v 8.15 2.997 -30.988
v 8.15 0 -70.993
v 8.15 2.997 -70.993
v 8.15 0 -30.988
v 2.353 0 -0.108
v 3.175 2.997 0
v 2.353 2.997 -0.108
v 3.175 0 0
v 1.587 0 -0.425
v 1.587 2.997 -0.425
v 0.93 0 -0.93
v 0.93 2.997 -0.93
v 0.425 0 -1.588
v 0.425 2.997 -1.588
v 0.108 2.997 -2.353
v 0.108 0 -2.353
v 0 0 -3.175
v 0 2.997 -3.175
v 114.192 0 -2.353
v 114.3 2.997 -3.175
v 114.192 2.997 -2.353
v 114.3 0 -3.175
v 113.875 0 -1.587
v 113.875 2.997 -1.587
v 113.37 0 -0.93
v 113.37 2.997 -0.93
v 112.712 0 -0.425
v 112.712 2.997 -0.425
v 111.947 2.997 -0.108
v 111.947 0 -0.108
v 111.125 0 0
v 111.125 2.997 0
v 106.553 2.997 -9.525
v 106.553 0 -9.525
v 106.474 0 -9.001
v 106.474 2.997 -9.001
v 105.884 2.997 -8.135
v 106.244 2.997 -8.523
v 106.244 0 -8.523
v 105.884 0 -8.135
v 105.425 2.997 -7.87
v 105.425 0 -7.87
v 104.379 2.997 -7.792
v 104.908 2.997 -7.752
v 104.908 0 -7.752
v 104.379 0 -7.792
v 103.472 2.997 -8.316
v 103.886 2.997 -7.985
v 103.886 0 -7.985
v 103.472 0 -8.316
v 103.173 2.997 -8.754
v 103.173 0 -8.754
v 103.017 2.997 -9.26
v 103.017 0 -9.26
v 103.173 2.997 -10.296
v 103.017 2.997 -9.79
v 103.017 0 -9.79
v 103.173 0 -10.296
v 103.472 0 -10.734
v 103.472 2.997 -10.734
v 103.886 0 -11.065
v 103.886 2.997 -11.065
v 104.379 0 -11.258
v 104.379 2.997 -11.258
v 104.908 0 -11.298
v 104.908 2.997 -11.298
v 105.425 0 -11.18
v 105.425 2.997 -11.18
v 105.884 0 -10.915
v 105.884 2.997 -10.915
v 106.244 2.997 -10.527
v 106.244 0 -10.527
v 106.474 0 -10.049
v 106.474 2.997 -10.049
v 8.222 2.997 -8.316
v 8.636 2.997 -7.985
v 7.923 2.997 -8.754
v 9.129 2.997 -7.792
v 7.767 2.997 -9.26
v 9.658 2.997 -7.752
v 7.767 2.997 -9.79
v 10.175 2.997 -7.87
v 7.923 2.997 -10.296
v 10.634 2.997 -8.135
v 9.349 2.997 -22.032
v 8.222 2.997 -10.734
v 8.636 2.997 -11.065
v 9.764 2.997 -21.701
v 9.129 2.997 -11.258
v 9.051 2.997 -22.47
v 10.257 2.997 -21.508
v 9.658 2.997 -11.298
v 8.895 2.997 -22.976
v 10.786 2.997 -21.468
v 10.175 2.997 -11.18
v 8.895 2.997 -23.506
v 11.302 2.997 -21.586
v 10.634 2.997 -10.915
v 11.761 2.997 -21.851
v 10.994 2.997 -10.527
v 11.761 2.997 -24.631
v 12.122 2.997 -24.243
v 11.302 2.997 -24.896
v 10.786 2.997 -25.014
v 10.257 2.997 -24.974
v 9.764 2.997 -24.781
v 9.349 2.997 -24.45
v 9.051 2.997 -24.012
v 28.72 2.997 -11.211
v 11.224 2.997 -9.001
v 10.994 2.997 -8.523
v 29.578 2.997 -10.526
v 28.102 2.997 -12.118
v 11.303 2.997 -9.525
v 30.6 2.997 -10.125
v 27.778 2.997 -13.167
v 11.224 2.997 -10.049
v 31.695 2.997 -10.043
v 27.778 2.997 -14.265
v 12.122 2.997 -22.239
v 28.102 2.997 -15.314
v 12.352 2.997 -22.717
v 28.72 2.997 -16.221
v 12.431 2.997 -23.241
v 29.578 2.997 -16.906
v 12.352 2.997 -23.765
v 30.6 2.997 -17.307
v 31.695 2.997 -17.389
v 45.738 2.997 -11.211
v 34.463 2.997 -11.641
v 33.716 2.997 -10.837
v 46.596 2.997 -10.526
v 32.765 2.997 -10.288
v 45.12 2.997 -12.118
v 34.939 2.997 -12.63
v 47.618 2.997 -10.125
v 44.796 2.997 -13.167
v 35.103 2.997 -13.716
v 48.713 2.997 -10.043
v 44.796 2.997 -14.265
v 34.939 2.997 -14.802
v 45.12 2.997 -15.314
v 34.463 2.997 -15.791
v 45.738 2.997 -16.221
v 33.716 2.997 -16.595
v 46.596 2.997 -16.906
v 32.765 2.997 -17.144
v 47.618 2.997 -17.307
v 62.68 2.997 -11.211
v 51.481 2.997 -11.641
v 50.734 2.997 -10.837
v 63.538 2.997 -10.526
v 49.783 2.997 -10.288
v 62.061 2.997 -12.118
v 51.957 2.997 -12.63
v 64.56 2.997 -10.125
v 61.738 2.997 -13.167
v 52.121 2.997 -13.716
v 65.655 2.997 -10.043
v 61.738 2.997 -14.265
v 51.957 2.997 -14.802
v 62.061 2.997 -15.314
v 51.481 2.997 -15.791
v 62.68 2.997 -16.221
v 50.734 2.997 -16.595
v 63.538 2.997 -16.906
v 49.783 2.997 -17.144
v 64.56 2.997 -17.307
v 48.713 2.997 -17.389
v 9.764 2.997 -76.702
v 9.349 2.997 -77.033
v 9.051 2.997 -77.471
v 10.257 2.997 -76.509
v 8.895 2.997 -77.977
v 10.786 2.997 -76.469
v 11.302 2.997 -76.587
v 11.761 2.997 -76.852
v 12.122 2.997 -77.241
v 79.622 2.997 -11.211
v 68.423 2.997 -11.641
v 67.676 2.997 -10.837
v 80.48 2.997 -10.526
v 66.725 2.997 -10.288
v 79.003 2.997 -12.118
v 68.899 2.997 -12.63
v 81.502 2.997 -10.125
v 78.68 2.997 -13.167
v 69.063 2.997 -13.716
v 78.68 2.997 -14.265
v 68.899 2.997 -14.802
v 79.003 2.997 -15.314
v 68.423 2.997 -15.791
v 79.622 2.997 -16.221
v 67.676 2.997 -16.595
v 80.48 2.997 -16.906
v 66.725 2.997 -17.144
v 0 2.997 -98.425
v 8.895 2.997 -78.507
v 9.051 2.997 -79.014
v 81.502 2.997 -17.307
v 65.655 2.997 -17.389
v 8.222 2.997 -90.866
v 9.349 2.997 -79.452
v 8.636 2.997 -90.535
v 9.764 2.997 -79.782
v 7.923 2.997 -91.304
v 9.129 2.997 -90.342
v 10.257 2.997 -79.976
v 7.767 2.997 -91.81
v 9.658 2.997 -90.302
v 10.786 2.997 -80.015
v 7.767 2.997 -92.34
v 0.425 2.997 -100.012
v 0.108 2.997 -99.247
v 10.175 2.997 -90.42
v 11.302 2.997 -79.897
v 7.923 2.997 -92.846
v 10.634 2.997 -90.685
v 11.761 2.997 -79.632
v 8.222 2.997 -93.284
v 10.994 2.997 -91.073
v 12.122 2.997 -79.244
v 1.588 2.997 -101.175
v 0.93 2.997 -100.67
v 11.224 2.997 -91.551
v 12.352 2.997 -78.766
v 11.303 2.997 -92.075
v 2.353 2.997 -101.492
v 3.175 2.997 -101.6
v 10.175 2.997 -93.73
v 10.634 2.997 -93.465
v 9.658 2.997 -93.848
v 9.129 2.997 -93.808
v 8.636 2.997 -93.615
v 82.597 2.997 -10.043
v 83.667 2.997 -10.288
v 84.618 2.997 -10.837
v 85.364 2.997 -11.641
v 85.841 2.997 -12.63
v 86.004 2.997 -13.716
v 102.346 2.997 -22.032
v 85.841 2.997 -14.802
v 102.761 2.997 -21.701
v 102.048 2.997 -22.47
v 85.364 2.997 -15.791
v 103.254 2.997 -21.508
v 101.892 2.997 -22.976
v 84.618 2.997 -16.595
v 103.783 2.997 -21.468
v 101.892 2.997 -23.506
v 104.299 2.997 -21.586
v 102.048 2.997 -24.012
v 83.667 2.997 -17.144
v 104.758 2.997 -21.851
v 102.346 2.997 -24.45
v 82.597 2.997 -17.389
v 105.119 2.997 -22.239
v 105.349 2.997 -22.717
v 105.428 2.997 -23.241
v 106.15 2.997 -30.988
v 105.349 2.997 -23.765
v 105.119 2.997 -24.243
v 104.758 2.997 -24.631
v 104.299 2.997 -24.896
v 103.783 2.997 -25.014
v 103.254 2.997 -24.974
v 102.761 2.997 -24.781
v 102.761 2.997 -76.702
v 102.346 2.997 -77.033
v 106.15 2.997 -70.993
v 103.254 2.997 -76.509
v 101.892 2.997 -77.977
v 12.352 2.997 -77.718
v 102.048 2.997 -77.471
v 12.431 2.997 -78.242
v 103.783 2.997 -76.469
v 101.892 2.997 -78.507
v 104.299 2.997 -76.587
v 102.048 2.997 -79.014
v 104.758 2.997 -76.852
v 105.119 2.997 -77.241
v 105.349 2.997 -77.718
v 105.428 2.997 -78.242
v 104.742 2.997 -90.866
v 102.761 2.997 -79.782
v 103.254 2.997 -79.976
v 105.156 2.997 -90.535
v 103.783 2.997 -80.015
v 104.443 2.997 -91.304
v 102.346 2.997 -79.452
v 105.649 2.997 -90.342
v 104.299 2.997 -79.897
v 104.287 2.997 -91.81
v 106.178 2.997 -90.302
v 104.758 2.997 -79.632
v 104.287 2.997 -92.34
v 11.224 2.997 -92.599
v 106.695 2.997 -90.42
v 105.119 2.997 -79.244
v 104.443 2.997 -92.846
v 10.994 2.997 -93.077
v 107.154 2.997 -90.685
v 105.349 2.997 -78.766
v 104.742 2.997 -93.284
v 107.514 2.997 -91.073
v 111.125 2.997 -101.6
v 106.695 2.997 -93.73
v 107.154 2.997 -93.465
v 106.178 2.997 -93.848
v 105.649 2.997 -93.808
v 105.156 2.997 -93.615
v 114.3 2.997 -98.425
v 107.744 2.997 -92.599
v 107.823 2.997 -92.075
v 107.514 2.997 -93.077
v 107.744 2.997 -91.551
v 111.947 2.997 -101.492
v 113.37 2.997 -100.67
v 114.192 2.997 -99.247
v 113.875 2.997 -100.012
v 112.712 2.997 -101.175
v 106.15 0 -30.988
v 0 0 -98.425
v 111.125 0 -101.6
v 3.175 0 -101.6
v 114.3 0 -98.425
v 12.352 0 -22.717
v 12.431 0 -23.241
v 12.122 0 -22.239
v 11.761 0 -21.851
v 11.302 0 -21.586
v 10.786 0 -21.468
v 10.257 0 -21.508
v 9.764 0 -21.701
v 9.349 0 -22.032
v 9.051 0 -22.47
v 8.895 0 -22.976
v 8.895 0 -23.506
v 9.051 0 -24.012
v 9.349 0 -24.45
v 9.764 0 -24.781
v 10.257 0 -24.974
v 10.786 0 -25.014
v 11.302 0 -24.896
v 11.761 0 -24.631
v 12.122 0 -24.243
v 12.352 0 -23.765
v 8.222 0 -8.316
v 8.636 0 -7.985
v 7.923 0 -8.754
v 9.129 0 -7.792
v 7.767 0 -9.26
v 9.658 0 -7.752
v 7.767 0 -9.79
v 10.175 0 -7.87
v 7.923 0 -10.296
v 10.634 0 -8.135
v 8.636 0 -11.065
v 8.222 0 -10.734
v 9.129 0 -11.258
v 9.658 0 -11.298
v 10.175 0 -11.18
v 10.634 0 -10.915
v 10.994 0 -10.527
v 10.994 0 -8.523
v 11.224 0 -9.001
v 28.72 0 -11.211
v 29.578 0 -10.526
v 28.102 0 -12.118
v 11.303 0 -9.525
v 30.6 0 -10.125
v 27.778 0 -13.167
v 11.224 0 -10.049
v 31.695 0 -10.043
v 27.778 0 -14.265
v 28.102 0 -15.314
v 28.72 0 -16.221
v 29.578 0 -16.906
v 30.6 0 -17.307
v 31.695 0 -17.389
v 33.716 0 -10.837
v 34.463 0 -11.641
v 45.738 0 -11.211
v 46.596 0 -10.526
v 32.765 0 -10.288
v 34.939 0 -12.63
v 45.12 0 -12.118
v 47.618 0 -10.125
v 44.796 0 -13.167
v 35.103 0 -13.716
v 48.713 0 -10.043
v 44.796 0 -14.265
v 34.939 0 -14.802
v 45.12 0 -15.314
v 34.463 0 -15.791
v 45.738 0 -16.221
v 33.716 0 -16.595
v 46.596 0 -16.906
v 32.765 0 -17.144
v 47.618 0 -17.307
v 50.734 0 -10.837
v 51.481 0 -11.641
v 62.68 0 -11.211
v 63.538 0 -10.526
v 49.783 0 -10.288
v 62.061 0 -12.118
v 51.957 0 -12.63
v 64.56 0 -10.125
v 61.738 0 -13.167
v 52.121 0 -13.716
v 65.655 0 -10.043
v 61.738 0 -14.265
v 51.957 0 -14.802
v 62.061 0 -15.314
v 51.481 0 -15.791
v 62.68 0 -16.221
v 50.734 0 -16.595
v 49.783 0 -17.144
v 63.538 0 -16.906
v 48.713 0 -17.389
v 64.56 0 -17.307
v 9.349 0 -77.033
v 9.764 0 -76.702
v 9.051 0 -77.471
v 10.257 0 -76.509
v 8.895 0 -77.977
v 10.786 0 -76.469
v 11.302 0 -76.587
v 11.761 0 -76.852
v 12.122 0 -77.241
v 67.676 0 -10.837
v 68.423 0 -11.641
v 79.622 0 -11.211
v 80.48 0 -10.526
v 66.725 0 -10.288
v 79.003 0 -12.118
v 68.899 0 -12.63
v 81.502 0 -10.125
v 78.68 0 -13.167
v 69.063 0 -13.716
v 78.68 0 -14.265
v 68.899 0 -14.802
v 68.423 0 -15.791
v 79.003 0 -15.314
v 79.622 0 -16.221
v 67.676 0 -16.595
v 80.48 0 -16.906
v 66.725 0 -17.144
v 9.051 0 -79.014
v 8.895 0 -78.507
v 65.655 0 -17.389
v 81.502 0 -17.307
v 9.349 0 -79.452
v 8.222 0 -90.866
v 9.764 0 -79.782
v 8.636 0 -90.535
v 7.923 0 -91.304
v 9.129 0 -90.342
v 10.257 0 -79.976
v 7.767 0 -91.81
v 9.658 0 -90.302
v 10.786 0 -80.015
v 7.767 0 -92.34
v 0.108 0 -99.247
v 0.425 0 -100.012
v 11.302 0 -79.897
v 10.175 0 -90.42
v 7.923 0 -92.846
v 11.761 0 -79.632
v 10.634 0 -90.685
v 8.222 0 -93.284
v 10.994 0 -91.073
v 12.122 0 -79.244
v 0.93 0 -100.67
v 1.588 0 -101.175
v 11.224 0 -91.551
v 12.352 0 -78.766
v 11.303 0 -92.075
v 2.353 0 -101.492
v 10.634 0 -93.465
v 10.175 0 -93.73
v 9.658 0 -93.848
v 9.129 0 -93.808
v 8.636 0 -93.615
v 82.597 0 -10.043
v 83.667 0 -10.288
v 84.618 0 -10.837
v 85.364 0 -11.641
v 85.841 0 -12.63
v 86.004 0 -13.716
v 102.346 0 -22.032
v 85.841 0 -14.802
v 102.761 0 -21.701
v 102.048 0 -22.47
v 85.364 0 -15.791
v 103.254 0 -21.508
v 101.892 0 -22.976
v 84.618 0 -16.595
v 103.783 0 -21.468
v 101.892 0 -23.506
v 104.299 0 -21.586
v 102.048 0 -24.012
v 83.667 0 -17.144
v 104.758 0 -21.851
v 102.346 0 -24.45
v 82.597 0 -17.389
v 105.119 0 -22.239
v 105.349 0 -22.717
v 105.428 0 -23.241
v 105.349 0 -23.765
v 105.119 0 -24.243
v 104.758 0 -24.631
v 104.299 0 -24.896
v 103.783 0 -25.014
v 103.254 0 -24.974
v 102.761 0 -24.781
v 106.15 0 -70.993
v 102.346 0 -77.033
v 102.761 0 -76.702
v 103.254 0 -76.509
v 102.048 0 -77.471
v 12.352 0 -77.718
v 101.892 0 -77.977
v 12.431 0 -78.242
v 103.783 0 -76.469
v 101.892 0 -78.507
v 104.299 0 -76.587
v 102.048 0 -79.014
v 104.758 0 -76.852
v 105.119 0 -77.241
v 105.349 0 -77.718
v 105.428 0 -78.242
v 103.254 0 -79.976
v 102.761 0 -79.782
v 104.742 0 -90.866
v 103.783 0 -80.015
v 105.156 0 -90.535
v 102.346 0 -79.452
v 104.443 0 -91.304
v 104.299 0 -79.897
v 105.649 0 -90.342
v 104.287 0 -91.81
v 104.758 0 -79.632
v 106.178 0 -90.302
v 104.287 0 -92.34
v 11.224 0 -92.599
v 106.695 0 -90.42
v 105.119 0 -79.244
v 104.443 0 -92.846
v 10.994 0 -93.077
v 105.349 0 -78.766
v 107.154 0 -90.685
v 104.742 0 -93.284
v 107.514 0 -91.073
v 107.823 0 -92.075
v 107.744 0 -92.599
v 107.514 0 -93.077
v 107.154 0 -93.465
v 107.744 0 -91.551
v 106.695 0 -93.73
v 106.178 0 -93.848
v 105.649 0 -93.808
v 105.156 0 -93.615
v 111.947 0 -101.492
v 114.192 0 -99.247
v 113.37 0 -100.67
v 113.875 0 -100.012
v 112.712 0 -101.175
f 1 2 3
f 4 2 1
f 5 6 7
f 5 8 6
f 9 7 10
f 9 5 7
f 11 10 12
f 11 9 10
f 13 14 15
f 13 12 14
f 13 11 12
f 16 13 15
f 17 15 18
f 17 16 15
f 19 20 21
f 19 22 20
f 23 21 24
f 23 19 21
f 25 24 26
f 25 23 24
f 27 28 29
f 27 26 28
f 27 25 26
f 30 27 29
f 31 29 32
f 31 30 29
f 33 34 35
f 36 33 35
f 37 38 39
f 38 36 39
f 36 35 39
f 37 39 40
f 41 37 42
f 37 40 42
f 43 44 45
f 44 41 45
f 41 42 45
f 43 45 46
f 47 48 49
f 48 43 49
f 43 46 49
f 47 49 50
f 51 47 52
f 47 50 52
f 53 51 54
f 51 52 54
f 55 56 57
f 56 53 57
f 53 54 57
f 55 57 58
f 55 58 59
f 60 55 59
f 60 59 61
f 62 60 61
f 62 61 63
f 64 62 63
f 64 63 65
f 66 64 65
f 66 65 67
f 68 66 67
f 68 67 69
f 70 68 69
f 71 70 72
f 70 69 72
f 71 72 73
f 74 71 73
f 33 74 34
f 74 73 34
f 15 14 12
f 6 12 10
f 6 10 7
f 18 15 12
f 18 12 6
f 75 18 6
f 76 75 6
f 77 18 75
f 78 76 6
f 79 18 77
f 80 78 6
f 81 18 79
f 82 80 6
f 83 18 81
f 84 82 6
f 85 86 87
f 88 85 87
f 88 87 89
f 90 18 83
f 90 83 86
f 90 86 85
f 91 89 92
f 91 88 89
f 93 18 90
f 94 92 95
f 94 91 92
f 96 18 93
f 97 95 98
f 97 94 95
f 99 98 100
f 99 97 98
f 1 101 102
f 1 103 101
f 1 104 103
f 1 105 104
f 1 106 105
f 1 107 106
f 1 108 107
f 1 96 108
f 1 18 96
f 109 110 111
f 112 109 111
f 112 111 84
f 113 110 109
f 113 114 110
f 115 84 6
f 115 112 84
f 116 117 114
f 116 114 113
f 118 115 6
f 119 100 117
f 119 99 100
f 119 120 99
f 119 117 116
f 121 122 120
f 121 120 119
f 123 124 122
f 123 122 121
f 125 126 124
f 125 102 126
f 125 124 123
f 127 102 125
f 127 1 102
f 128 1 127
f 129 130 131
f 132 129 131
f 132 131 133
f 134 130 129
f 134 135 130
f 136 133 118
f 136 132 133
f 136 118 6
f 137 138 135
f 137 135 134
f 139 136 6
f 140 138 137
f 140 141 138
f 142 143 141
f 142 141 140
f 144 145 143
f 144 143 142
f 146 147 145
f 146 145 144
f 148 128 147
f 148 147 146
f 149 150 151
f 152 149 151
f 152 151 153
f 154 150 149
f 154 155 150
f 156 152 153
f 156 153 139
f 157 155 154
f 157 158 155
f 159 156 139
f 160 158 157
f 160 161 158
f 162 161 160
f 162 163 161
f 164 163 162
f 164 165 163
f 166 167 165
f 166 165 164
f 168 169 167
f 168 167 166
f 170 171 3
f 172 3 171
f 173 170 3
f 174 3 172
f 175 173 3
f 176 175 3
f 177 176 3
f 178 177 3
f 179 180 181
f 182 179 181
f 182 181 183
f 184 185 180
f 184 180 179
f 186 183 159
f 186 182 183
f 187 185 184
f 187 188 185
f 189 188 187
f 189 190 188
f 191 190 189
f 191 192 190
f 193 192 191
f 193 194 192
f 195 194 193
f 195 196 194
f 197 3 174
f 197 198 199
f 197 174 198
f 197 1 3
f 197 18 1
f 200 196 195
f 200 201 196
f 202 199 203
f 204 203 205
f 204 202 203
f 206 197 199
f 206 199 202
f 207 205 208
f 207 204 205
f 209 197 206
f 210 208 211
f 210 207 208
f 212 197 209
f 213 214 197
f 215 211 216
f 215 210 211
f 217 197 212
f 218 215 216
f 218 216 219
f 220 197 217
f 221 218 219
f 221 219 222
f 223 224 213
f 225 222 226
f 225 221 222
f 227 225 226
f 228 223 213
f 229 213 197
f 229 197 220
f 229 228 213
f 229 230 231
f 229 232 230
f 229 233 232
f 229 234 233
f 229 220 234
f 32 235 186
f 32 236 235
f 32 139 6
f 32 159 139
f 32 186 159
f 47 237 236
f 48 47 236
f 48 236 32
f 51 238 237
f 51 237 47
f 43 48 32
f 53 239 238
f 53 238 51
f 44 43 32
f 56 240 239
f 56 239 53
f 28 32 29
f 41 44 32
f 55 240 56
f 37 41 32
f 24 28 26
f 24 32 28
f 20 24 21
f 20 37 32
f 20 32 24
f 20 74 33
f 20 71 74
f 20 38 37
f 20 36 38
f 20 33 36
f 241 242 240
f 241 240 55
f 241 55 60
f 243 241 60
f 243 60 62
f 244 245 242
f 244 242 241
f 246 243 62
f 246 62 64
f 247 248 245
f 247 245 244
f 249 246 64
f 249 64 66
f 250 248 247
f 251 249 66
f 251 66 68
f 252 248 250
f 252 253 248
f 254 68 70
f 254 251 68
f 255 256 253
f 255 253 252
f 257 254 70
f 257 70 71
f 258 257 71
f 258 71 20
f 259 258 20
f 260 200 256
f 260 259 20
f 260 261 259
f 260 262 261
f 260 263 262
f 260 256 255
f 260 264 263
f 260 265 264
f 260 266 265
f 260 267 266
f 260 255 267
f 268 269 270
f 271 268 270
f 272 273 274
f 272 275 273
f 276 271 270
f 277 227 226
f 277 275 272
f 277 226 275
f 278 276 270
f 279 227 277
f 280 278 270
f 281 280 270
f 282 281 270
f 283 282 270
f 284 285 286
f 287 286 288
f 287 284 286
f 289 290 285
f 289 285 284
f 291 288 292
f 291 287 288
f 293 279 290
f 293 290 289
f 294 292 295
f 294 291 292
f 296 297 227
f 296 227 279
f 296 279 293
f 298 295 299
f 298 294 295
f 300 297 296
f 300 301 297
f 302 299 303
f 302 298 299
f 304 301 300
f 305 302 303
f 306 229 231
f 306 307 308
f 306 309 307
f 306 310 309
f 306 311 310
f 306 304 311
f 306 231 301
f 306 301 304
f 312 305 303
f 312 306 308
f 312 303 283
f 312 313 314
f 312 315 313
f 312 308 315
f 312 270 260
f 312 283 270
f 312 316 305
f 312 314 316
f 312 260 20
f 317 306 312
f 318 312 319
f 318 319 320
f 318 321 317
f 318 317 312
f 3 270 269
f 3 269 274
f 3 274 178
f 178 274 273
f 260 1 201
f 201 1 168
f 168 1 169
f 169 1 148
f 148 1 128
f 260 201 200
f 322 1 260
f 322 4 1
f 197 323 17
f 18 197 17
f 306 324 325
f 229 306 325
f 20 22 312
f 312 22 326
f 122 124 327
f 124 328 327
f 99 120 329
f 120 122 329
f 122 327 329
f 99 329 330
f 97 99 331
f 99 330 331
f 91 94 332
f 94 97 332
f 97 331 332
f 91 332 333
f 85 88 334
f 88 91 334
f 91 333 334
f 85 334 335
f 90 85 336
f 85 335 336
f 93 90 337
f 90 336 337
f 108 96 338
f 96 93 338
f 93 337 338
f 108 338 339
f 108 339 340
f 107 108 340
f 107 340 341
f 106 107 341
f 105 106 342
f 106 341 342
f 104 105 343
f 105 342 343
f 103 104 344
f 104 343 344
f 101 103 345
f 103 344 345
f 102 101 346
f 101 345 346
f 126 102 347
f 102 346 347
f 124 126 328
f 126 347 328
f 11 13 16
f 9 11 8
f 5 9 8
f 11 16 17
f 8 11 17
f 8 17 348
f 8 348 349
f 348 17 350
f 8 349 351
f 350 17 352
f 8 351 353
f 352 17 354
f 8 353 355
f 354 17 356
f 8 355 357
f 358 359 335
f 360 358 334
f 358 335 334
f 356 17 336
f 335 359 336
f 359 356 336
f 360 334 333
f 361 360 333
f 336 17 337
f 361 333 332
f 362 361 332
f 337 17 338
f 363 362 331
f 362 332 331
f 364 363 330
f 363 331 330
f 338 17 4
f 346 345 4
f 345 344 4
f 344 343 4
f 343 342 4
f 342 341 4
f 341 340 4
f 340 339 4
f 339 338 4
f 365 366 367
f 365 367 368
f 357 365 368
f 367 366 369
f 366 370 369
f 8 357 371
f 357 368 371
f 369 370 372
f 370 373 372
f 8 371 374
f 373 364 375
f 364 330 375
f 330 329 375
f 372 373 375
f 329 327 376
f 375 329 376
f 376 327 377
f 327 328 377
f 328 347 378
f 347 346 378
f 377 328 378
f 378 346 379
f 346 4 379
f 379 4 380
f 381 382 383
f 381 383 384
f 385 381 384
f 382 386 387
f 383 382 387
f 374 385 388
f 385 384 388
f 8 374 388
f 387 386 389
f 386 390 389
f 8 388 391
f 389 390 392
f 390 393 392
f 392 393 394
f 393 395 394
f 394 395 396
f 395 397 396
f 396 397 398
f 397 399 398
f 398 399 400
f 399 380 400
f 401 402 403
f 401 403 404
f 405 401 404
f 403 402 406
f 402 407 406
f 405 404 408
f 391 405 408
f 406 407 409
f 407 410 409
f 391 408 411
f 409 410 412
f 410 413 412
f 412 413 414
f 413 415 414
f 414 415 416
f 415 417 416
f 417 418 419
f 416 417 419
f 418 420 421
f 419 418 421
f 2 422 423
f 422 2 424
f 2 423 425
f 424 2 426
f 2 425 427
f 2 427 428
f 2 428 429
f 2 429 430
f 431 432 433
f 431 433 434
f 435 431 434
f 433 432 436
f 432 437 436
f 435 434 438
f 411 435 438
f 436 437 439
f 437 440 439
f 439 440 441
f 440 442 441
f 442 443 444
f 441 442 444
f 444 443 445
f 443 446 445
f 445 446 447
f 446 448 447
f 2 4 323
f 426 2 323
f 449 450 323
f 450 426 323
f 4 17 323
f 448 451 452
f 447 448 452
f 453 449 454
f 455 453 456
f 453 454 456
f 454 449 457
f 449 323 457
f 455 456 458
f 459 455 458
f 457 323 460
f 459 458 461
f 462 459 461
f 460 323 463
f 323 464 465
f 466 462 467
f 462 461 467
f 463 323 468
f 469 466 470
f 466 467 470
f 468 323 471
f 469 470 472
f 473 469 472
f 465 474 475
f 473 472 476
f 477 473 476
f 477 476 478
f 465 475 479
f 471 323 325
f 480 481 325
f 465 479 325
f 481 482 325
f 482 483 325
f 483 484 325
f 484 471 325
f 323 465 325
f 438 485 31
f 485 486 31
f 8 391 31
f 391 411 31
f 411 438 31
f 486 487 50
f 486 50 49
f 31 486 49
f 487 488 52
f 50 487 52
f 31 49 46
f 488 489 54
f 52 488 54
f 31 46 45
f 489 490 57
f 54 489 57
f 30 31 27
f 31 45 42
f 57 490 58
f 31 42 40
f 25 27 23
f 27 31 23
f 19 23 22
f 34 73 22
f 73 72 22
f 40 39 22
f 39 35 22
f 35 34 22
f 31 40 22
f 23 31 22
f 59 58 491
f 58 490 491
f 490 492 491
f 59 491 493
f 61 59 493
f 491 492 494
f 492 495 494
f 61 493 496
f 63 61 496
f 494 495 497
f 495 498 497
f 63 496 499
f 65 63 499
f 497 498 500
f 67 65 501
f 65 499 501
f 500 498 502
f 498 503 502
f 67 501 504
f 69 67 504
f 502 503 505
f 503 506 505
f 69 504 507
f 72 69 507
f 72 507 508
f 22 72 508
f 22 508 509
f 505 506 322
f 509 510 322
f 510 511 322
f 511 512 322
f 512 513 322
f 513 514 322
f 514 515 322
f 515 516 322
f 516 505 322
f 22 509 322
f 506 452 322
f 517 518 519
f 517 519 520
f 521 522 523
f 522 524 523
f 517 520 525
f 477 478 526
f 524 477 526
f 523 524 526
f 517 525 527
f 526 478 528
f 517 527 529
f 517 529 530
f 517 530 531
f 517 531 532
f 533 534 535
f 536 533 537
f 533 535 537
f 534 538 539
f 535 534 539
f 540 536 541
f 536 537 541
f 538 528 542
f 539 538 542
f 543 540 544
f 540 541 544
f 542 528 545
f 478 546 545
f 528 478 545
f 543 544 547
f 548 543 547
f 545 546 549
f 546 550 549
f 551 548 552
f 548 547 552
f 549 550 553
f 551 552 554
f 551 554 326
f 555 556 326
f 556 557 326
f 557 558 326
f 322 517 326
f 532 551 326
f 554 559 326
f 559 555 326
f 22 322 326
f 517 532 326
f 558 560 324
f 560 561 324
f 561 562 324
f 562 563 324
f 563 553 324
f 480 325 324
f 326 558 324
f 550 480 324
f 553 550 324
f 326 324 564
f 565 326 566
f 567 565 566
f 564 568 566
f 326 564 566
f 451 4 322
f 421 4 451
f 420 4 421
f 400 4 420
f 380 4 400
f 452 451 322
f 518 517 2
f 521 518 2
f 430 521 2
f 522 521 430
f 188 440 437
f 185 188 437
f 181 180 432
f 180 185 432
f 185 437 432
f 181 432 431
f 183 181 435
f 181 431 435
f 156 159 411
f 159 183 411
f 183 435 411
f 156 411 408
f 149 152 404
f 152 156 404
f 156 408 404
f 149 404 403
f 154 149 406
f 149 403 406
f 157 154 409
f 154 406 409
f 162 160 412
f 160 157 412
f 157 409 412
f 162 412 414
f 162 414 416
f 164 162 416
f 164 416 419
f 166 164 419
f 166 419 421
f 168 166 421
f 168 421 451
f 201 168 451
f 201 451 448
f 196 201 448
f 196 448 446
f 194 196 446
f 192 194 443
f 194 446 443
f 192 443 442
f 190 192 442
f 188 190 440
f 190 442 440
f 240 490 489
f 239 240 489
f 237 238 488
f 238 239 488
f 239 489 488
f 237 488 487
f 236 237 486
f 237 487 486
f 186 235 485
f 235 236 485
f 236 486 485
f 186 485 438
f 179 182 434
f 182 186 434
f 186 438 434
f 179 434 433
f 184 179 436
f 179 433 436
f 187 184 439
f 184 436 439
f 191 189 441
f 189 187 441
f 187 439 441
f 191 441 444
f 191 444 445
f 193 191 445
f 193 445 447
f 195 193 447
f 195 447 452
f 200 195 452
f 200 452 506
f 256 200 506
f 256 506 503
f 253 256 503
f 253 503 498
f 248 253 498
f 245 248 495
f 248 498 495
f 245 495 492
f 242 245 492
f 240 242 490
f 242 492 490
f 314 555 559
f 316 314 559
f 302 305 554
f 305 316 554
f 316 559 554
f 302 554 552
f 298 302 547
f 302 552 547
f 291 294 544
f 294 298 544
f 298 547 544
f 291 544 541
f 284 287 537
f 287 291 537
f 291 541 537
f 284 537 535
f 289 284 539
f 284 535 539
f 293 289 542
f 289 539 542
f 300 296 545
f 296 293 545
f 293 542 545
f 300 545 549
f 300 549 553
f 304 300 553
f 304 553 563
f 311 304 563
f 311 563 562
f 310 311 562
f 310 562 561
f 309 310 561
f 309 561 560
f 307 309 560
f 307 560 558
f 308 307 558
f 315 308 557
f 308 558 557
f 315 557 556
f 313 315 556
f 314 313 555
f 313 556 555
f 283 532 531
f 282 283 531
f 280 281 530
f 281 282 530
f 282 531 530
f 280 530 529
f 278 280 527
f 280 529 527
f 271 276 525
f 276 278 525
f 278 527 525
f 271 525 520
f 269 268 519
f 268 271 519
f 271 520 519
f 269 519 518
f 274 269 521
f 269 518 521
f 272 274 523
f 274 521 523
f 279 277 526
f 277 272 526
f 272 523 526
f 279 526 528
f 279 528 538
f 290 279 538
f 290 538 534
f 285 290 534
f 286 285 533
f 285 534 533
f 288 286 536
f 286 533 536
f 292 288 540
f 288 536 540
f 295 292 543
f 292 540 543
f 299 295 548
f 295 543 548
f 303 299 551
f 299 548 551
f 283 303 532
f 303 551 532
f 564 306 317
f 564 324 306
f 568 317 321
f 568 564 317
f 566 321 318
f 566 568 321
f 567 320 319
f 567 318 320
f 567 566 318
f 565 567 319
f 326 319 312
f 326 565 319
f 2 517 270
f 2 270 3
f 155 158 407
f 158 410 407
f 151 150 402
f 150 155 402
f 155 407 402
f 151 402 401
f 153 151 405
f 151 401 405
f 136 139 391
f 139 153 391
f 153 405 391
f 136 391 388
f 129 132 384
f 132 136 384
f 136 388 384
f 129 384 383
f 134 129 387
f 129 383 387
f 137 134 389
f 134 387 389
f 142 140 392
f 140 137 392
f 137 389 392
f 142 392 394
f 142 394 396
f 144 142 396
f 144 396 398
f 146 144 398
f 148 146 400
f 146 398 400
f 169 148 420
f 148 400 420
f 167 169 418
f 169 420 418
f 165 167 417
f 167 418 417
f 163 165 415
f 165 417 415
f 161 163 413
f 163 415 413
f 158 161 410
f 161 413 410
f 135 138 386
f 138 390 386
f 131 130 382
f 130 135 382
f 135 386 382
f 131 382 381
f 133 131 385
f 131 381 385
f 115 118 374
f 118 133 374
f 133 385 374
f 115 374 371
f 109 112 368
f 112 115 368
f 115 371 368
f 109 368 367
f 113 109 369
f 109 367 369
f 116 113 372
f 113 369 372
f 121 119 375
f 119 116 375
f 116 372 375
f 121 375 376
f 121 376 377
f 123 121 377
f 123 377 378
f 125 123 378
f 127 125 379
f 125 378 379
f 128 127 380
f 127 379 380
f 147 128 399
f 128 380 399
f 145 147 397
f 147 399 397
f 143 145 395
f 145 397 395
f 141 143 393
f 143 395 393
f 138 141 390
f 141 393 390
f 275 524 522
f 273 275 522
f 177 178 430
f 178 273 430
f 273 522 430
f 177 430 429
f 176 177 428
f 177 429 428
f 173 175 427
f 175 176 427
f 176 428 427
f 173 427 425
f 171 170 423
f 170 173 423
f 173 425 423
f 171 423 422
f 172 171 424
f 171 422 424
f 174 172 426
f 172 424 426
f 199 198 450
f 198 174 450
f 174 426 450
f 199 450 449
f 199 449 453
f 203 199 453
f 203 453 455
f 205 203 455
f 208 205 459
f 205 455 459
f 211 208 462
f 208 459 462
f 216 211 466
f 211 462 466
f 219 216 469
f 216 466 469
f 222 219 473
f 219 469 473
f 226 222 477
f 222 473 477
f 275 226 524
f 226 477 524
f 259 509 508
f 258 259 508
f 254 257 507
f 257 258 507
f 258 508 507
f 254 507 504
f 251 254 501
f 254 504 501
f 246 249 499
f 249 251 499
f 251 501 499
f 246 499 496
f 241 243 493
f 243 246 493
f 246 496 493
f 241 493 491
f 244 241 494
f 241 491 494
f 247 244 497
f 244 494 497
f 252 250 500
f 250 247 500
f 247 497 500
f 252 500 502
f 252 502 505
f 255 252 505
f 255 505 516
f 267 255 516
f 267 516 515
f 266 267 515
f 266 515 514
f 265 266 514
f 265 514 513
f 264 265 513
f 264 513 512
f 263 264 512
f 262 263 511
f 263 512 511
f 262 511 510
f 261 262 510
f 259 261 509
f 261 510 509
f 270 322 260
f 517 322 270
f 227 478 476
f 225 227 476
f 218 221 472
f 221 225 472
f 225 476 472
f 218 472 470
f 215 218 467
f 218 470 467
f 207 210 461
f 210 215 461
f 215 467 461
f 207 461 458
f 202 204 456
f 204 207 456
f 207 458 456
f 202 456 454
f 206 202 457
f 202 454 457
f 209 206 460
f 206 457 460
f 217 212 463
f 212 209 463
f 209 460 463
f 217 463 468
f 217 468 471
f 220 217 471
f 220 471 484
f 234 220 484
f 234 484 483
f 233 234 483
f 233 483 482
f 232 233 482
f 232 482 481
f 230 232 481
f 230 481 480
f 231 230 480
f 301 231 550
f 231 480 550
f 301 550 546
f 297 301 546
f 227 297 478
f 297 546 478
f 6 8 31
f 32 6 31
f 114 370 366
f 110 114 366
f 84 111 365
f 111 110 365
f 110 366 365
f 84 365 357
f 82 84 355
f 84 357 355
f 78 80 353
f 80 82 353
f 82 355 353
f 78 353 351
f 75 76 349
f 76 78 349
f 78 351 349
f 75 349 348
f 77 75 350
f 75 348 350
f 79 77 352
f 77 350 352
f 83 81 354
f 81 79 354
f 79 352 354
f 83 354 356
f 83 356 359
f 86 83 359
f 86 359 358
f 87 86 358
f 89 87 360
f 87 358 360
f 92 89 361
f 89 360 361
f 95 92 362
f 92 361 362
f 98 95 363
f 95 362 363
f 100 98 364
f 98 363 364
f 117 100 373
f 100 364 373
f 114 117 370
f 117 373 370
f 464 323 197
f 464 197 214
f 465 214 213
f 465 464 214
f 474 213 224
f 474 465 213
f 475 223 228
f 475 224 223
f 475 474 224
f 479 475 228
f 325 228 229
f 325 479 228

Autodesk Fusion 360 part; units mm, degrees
sketch "Sketch1" plane through (0, 0, 0) normal (0, 1, 0) x (1, 0, 0)
  arc A0 (111.125, 0) -> (114.3, 3.175) centre (111.125, 3.175) ccw
  line L0 (0, 0) -> (114.3, 0)
  line L1 (114.3, 0) -> (114.3, 101.6)
  arc A1 (3.175, 101.6) -> (0, 98.425) centre (3.175, 98.425) ccw
  arc A2 (0, 3.175) -> (3.175, 0) centre (3.175, 3.175) ccw
  circle A3 centre (25.4, 50.8) radius 3.175
  circle A4 centre (88.9, 50.8) radius 3.175
  line L2 (0, 101.6) -> (0, 0)
  line L3 (114.3, 101.6) -> (0, 101.6)
  arc A5 (114.3, 98.425) -> (111.125, 101.6) centre (111.125, 98.425) ccw
  line L4 (8.1496, 70.993) -> (8.1496, 30.988)
  line L5 (106.1504, 70.993) -> (8.1496, 70.993)
  line L6 (8.1496, 30.988) -> (106.1504, 30.988)
  line L7 (106.1504, 80.6374) -> (8.1496, 80.6374)
  line L8 (8.1496, 20.6375) -> (106.1504, 20.6375)
  line L9 (106.1504, 20.6375) -> (106.1504, 80.6374)
  line L10 (8.1496, 80.6374) -> (8.1496, 20.6375)
  line L11 (106.1504, 30.988) -> (106.1504, 70.993)
  circle A6 centre (65.3796, 13.716) radius 3.683
  circle A7 centre (48.4378, 13.716) radius 3.683
  circle A8 centre (82.3214, 13.716) radius 3.683
  circle A9 centre (31.4198, 13.716) radius 3.683
  circle A10 centre (103.6498, 23.241) radius 1.778
  circle A11 centre (10.6528, 23.241) radius 1.778
  circle A12 centre (10.6528, 78.2422) radius 1.778
  circle A13 centre (103.6498, 78.2422) radius 1.778
  circle A14 centre (9.525, 92.075) radius 1.778
  circle A15 centre (9.525, 9.525) radius 1.778
  circle A16 centre (104.775, 9.525) radius 1.778
  circle A17 centre (106.045, 92.075) radius 1.778
extrude "Extrude1" add sketch "Sketch1" along normal blind 2.9972 contours A0 L0 L1 A1 A2 L2 L3 A5 | L5 L7 L9 L10 | L6 L8 L9 L10
